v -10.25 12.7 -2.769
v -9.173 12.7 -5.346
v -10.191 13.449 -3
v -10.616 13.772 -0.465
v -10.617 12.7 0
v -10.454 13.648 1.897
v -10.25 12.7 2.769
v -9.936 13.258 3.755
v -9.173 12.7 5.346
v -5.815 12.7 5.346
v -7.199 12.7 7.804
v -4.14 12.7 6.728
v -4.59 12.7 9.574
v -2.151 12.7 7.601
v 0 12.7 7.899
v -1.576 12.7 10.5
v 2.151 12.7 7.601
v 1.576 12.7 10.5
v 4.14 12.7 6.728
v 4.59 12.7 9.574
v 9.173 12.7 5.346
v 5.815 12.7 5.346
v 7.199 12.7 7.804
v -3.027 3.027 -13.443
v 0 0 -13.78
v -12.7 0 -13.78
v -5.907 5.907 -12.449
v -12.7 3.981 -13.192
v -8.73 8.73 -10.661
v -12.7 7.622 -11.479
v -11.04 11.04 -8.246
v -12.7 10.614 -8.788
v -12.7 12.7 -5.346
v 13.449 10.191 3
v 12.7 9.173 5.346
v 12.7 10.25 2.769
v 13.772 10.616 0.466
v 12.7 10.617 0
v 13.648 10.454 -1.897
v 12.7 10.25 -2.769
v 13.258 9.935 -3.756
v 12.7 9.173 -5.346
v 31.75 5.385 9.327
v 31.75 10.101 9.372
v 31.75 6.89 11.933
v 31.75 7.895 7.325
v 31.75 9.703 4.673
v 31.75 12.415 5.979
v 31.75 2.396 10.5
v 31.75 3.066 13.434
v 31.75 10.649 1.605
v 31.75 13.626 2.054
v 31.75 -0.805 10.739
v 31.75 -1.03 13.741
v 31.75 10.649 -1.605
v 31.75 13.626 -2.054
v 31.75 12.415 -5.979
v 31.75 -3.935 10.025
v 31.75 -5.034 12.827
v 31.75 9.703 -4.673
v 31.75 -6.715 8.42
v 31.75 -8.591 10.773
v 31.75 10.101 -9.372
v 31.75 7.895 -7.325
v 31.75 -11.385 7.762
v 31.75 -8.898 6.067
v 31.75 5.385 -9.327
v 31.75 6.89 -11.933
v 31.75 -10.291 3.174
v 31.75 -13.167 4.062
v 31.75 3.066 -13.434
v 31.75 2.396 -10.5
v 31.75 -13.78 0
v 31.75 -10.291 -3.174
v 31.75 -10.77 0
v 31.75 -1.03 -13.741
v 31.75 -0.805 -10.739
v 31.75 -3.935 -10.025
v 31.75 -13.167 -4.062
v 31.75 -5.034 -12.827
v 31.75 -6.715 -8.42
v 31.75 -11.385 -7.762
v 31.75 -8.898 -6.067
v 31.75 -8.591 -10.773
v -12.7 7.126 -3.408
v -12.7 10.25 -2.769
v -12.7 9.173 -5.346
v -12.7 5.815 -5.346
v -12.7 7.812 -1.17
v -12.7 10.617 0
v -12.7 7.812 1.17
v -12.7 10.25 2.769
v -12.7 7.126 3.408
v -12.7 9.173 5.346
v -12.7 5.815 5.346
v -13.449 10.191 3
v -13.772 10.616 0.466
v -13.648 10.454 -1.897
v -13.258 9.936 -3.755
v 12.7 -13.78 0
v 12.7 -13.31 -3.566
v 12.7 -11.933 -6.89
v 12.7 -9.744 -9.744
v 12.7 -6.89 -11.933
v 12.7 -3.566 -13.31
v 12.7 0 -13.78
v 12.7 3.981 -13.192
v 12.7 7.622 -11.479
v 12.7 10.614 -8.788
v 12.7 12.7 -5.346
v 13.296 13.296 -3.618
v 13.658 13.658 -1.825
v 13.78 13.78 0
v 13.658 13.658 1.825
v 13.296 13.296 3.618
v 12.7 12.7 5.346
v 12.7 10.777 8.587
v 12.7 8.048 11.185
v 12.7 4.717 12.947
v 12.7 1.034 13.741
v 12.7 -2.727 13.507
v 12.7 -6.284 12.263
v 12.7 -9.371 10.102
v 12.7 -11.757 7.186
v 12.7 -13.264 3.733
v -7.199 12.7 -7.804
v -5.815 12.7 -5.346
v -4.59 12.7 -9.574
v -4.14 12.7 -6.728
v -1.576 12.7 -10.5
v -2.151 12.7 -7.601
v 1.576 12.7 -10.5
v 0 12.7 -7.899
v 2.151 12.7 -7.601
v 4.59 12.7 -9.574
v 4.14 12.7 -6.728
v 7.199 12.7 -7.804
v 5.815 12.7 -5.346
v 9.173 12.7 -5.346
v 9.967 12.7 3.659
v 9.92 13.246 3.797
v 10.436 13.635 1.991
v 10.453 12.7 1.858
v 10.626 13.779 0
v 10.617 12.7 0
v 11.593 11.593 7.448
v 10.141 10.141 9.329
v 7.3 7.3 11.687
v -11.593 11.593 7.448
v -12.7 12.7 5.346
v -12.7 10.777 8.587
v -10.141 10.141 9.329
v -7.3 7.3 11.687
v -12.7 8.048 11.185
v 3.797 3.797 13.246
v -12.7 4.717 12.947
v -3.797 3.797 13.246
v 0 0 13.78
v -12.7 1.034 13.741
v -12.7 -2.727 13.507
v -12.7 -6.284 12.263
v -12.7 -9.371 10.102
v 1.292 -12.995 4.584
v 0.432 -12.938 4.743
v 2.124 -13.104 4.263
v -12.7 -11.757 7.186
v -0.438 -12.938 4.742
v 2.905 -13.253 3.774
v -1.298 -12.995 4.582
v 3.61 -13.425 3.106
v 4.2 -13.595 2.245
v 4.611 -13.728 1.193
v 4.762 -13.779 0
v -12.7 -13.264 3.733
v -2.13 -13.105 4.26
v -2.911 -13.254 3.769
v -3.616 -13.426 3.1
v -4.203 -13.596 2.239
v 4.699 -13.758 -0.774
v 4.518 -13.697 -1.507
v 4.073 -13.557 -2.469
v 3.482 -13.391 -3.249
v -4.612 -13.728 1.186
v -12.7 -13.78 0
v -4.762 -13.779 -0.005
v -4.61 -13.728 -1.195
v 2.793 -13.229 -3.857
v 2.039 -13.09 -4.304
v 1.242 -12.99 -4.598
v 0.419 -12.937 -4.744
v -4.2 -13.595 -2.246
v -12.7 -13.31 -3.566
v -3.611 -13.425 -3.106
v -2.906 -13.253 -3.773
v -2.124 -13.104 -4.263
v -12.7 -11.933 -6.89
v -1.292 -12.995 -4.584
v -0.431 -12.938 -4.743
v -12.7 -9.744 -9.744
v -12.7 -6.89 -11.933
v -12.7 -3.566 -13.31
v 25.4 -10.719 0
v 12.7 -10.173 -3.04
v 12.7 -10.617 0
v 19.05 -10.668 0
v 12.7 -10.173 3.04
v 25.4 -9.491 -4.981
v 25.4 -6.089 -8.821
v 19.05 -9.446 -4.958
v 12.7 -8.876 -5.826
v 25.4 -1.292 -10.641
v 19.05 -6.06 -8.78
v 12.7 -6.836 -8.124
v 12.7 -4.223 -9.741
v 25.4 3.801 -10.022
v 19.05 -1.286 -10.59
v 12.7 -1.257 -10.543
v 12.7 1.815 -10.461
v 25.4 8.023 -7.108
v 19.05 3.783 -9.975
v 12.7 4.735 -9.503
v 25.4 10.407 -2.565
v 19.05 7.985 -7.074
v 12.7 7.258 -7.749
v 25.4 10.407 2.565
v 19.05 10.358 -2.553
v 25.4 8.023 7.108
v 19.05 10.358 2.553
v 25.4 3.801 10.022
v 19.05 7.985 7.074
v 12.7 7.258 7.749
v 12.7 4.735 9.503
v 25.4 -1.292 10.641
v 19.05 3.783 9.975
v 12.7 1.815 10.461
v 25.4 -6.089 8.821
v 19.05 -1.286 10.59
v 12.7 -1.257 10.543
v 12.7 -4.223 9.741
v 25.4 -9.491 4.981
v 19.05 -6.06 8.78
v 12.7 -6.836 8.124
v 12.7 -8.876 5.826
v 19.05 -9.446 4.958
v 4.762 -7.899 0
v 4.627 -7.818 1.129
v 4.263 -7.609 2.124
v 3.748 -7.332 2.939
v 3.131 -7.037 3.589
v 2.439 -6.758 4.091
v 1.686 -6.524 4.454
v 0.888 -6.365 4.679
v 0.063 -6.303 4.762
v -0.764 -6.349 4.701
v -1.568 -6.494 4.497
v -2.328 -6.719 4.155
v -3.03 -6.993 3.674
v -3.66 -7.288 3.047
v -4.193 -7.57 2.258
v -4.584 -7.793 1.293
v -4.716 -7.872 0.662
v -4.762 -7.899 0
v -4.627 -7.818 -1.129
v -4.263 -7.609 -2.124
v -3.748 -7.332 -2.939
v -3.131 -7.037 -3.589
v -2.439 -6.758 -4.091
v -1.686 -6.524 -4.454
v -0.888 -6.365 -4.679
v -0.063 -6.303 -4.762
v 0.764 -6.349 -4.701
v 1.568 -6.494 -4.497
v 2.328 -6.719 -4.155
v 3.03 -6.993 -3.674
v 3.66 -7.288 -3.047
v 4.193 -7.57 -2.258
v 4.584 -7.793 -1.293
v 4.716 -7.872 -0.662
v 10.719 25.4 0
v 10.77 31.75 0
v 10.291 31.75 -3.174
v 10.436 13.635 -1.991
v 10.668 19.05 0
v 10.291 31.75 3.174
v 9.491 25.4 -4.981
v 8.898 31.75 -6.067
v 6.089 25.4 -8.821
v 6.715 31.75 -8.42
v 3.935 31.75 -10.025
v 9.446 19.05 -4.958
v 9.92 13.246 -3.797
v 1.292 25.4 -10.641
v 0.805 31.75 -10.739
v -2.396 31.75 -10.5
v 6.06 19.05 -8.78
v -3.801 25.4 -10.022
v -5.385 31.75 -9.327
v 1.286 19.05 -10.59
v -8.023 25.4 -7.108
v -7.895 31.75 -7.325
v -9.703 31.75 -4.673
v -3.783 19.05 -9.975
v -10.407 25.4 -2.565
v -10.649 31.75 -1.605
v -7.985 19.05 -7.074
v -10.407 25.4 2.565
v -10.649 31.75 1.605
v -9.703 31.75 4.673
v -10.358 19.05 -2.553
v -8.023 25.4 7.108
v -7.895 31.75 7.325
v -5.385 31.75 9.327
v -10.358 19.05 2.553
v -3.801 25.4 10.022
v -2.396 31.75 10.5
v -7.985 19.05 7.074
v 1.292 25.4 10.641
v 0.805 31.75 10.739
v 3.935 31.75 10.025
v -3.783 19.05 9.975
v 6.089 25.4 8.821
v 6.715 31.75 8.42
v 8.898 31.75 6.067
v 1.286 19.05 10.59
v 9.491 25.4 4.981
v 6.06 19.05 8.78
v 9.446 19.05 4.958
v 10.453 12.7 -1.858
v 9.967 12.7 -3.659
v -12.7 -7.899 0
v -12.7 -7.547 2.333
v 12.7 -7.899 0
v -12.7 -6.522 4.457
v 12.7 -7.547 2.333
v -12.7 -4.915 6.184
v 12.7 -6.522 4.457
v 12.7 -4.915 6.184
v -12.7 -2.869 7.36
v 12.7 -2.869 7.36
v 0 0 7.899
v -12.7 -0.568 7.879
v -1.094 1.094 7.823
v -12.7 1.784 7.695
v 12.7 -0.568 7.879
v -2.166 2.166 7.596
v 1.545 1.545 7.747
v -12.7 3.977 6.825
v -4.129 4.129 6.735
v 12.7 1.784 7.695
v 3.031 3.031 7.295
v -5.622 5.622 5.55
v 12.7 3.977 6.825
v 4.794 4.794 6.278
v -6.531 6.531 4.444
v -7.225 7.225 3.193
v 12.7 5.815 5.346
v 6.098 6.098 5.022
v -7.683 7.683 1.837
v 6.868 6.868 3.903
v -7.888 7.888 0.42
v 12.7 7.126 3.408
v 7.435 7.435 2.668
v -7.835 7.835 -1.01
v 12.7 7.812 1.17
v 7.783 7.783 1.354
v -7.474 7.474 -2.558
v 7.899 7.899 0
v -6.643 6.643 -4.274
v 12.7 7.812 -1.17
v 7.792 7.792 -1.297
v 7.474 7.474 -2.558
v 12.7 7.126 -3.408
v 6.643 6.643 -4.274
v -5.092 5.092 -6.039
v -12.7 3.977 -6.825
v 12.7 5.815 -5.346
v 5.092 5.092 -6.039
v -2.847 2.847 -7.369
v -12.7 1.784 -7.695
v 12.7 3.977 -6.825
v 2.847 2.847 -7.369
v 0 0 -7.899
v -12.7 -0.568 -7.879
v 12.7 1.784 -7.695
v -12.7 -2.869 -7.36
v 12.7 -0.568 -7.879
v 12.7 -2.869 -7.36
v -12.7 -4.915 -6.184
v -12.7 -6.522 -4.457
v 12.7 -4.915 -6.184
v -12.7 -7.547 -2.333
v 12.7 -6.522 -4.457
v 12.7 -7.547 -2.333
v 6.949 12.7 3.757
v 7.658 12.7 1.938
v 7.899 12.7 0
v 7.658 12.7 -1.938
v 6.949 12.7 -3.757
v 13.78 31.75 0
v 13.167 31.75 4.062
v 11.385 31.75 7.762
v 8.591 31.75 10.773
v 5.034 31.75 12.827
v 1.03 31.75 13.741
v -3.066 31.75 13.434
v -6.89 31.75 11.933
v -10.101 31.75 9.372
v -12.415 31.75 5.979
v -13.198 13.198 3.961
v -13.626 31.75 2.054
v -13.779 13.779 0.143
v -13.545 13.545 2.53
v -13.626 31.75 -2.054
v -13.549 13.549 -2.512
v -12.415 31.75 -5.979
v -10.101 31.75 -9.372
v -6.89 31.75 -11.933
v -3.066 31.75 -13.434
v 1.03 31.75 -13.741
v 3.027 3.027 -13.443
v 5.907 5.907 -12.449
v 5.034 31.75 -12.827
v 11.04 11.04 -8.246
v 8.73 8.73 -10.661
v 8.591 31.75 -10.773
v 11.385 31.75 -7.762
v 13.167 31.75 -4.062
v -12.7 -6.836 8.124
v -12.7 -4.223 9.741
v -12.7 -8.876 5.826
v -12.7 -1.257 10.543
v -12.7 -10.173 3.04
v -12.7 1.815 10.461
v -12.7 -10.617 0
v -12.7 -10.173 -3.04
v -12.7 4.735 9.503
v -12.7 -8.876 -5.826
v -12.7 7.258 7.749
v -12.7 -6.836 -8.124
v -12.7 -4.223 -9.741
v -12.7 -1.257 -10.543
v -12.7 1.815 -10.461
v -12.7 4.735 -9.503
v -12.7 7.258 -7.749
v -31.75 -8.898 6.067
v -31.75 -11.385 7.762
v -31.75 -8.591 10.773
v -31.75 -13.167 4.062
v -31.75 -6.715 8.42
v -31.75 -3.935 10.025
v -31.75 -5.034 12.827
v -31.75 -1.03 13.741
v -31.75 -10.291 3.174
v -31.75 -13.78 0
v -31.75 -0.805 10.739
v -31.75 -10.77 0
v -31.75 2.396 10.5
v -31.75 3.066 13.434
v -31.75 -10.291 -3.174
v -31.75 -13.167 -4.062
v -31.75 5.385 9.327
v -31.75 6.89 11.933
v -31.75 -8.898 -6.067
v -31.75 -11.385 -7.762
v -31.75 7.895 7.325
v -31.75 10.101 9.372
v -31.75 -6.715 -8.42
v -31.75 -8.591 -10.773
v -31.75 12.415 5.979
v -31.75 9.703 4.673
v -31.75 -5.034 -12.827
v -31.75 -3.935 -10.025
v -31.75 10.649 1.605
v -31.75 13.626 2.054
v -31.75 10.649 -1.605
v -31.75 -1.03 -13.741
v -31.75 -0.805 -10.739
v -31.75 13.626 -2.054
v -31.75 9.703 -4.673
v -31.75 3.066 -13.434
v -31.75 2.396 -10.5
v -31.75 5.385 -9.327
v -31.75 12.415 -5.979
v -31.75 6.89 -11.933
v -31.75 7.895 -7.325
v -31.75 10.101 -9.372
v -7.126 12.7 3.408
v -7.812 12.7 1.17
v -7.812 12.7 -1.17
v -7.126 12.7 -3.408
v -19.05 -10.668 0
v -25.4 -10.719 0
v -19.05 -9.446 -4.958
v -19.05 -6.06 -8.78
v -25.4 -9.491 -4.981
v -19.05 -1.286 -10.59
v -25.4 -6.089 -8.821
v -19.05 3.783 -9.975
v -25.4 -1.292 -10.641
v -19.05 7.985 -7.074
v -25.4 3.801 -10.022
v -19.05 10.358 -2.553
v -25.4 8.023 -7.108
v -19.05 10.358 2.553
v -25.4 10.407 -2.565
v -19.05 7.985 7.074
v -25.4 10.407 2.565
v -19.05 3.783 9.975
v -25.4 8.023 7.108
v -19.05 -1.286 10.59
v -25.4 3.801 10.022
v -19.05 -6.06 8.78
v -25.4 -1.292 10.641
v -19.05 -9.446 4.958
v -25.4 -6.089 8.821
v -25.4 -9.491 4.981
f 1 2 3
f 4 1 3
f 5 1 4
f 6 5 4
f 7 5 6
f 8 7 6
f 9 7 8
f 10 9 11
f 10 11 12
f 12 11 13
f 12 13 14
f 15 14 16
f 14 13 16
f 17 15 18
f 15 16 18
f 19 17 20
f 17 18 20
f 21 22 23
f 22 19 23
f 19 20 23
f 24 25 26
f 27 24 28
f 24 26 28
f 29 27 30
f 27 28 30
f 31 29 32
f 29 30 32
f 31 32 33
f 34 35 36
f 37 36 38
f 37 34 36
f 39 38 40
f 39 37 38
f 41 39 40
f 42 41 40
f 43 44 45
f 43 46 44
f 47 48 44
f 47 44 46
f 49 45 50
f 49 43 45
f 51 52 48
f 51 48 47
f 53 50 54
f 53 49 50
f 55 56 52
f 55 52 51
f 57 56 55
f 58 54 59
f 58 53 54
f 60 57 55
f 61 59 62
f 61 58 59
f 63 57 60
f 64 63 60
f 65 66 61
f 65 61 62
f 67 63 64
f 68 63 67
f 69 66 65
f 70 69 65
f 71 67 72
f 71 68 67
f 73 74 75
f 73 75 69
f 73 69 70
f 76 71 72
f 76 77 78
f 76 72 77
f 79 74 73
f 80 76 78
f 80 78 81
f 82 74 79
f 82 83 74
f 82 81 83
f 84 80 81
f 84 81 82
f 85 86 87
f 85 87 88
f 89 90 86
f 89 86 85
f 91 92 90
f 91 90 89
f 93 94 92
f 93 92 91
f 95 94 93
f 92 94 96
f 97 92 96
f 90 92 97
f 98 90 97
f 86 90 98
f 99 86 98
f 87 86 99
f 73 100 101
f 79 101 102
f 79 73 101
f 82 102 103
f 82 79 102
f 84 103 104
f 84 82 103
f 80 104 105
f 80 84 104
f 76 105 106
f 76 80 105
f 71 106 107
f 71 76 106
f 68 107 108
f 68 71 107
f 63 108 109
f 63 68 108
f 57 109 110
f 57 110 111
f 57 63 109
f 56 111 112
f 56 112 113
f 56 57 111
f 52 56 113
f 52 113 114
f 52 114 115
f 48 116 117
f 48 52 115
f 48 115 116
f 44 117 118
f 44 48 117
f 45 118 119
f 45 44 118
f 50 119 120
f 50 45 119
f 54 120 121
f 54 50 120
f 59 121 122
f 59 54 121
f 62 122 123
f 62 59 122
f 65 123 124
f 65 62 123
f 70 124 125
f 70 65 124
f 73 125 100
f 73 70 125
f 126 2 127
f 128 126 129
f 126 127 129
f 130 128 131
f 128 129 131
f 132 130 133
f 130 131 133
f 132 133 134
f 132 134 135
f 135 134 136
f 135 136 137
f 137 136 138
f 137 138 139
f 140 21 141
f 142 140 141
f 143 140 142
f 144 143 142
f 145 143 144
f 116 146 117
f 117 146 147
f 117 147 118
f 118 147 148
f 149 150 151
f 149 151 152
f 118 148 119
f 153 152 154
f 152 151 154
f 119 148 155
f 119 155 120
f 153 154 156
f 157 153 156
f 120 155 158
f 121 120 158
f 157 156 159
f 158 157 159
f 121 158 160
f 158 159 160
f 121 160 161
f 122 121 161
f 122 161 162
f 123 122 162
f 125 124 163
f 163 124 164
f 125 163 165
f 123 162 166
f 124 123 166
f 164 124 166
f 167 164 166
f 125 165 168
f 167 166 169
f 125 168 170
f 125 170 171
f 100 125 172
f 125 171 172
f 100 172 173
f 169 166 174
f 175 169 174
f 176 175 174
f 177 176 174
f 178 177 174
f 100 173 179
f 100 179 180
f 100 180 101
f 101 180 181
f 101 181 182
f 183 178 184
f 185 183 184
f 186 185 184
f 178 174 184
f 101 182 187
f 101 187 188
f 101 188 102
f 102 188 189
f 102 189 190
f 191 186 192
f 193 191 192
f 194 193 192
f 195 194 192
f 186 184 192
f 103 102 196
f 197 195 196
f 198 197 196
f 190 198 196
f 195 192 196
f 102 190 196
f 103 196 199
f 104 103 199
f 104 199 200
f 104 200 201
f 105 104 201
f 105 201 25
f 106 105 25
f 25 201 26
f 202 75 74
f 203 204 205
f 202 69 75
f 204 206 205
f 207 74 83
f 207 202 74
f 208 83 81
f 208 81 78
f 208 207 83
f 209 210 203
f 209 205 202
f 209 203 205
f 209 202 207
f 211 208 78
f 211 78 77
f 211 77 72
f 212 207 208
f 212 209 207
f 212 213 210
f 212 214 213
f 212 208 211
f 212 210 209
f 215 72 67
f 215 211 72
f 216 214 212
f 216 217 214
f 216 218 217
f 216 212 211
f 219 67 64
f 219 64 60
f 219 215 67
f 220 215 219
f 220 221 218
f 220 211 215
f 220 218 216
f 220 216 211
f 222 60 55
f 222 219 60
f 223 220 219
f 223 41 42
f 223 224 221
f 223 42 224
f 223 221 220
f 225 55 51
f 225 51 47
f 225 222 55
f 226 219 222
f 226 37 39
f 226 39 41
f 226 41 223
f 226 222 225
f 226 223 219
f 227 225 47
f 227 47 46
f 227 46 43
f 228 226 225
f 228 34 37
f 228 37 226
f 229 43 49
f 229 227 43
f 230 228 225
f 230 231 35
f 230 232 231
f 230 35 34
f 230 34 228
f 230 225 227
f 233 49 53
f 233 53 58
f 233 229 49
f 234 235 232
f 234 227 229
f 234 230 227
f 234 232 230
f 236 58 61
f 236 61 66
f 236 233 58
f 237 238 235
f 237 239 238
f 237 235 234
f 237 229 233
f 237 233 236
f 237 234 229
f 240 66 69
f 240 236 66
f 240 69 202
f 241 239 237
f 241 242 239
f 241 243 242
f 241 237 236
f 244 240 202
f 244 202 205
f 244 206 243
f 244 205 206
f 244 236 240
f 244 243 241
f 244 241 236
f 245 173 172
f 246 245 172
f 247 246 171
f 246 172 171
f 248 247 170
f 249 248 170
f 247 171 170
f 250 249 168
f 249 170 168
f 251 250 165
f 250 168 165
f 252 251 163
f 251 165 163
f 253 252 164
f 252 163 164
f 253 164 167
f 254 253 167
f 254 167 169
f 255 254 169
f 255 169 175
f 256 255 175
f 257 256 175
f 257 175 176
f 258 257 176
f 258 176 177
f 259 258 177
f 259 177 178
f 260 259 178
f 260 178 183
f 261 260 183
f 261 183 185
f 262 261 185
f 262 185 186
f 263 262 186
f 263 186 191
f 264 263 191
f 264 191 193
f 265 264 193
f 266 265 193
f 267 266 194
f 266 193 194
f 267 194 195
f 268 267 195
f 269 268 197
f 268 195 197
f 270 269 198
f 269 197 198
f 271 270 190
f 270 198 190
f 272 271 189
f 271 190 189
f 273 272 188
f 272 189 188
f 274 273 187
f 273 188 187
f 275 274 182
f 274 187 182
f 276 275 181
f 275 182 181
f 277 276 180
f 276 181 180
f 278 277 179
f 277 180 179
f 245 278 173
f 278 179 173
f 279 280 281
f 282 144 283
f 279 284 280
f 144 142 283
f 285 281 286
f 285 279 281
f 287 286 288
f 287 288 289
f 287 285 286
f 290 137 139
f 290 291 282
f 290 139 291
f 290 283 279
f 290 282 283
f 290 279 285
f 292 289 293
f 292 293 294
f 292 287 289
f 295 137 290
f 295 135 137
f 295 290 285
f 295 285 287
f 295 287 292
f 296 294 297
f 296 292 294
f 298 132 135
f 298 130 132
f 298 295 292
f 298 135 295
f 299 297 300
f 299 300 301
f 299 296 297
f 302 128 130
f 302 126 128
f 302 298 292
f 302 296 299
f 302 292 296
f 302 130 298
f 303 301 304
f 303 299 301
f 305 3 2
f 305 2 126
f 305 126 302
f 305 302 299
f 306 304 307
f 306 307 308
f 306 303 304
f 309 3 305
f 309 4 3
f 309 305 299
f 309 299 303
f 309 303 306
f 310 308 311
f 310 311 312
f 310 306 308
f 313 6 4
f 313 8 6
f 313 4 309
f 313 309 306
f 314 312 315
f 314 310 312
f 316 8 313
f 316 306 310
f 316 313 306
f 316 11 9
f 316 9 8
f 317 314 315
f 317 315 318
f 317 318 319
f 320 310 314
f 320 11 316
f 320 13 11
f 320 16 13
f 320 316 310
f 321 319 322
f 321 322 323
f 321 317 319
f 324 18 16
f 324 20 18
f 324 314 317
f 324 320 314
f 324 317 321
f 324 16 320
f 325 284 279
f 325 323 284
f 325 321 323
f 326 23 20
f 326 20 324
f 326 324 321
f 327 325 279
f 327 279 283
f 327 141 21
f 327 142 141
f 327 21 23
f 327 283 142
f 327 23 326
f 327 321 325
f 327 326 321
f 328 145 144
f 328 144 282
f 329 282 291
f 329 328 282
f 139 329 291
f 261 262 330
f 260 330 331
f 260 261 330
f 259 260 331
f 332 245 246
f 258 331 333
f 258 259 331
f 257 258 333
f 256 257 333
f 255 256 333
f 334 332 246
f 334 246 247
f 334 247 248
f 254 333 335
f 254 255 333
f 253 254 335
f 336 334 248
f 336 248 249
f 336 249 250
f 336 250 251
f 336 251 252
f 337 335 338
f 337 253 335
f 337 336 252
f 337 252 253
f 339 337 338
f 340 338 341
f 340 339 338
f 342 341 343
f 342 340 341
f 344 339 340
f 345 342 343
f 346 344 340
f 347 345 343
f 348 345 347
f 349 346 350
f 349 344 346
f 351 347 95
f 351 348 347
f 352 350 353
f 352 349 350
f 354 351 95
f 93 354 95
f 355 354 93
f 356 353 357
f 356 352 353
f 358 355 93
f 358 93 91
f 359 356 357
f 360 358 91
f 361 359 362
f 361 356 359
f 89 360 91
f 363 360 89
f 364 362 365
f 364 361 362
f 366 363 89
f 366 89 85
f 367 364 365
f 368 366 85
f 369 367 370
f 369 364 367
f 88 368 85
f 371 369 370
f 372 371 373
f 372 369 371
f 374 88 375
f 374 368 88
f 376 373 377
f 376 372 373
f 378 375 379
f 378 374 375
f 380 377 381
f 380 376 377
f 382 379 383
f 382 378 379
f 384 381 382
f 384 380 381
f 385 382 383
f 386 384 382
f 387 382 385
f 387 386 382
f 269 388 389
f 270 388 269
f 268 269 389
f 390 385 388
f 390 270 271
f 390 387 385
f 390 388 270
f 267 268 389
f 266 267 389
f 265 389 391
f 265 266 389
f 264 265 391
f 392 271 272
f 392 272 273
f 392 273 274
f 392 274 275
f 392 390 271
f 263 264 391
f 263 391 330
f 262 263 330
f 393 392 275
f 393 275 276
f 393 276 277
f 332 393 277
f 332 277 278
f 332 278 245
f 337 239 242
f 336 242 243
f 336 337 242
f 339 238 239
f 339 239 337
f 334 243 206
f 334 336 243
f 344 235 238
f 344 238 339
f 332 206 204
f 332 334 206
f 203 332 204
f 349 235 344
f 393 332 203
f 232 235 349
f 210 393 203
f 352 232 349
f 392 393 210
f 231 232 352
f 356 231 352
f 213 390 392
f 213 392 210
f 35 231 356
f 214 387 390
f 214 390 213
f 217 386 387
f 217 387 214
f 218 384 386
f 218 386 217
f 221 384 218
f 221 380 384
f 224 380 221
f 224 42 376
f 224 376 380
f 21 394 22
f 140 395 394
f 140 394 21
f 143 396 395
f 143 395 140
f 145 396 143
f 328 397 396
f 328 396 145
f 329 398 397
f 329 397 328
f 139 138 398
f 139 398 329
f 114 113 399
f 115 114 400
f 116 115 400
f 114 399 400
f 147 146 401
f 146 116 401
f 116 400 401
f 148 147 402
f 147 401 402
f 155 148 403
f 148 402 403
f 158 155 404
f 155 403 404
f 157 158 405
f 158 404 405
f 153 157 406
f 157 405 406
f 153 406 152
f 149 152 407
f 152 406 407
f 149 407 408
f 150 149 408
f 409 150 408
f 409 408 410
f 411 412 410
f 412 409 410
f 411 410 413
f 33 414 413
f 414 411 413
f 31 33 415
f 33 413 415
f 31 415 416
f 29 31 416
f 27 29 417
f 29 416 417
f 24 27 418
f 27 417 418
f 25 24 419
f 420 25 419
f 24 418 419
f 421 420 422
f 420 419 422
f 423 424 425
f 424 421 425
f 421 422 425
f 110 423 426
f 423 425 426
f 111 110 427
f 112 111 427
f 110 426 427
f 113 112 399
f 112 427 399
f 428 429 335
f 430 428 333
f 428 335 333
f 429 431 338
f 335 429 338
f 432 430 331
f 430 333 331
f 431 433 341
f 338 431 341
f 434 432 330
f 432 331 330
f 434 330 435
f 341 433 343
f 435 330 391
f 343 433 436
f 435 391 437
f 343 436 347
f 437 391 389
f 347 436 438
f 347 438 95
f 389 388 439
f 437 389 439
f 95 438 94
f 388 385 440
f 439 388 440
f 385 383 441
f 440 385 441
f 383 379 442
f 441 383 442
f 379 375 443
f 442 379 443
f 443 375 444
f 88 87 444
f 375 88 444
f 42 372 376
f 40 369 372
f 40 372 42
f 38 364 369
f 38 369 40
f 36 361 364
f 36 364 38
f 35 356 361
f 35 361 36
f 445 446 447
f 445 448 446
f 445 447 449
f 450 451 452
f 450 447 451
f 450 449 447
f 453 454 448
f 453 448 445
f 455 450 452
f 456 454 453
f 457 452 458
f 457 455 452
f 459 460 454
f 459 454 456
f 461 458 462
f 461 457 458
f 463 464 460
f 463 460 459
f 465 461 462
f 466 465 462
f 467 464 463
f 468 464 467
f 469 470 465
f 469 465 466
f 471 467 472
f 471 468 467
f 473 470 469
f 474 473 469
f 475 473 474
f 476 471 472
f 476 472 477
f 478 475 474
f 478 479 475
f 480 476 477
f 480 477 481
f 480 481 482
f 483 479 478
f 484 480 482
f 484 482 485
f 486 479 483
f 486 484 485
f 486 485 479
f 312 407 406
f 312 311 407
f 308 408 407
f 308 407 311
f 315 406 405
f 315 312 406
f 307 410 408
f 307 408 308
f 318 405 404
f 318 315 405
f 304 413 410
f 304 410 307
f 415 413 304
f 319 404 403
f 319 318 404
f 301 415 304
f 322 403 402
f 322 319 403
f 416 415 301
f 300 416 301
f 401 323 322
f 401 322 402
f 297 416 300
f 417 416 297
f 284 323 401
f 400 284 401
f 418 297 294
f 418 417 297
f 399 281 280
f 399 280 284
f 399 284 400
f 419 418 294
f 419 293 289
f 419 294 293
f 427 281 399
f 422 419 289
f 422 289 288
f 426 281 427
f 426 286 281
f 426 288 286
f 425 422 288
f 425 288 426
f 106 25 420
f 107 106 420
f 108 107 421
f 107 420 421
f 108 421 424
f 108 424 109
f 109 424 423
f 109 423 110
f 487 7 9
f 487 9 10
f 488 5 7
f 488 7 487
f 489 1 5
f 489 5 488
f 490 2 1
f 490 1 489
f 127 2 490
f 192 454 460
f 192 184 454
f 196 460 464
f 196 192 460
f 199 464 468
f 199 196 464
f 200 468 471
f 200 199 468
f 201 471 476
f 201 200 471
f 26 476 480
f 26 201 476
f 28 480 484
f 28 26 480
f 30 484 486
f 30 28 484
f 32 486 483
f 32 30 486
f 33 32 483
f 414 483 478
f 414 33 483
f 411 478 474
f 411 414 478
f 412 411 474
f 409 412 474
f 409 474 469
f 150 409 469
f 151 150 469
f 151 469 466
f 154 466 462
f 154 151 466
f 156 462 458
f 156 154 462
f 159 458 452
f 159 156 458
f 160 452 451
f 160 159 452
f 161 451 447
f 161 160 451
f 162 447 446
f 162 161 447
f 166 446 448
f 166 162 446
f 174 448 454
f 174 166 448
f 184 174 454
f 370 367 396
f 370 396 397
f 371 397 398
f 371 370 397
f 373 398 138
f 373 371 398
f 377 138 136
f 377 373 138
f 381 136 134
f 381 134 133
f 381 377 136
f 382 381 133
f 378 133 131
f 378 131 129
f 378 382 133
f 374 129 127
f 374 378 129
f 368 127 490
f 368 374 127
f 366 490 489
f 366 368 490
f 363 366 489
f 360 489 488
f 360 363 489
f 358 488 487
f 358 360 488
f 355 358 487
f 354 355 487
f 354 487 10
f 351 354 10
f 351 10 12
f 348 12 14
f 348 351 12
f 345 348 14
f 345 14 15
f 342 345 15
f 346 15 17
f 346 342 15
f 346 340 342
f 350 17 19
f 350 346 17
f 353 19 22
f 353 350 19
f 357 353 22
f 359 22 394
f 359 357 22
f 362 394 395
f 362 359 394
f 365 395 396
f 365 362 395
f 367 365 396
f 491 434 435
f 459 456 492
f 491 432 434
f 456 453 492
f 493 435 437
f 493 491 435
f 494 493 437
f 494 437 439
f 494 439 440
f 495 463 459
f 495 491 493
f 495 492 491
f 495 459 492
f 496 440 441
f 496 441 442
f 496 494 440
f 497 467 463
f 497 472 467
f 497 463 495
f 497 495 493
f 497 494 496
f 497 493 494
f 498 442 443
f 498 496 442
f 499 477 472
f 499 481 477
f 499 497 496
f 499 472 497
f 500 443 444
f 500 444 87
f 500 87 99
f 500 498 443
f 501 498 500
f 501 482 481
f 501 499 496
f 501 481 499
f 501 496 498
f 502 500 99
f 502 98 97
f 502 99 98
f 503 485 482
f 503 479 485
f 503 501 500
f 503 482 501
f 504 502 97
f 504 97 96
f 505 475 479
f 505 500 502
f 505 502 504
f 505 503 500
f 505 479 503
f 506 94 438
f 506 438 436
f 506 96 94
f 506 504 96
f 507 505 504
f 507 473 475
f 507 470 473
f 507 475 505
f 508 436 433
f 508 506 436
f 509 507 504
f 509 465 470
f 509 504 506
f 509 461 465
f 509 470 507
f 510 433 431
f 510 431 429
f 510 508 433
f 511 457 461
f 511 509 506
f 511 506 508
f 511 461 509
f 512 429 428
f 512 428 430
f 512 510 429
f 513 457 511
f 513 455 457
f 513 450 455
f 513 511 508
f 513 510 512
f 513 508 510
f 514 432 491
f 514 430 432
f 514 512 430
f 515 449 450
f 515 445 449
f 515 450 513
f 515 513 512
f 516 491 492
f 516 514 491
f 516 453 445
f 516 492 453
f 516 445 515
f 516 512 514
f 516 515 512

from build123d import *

# Parameters (mm, degrees)
SKETCH4_R                    = 13.7795
BOSS_EXTRUDE1_DEPTH          = 25.4
SKETCH5_R                    = 13.7795
BOSS_EXTRUDE2_DEPTH          = 12.7
F_3_8_0_375_DIAMETER_HOLE1_D = 9.525


with BuildPart() as part:
    # Sketch1 → Revolve1 (revolve)
    with BuildSketch(Plane.XY):
        Polygon((-31.75, -13.7795), (-12.7, -13.7795), (-12.7, -10.6172), (-31.75, -10.7696), align=None)
        Polygon((31.75, -10.7696), (12.7, -10.6172), (12.7, -13.7795), (31.75, -13.7795), align=None)
    revolve(axis=Axis((-31.75, 0, 0), (1, 0, 0)))



with BuildPart() as body_2:
    # Sketch2 → Revolve2 (revolve)
    with BuildSketch(Plane.XY):
        Polygon((10.7696, 31.75), (10.6172, 12.7), (13.7795, 12.7), (13.7795, 31.75), align=None)
    revolve(axis=Axis((0, 0, 0), (0, 1, 0)))


with BuildPart() as part_1:
    add(part.part)

    add(body_2.part)  # Boss-Extrude1 merges body 2
    # Sketch4 → Boss-Extrude1 (add)
    with BuildSketch(Plane(origin=(-12.7, 0, 0), x_dir=(0, 0, -1), z_dir=(1, 0, 0))):
        Circle(SKETCH4_R)
    extrude(amount=BOSS_EXTRUDE1_DEPTH)

    # Sketch5 → Boss-Extrude2 (add)
    with BuildSketch(Plane.XZ.offset(-12.7)):
        Circle(SKETCH5_R)
    extrude(amount=BOSS_EXTRUDE2_DEPTH)

    # Sketch6 → Cut-Revolve1 (revolve, cut)
    with BuildSketch(Plane.XY):
        Polygon((-31.75, -10.7696), (-12.7, -10.6172), (-12.7, -7.8994), (12.7, -7.8994), (12.7, -10.6172), (31.75, -10.7696), (31.75, 0), (-31.75, 0), align=None)
    revolve(axis=Axis((31.75, 0, 0), (-1, 0, 0)), mode=Mode.SUBTRACT)

    # Sketch7 → Cut-Revolve2 (revolve, cut)
    with BuildSketch(Plane.XY):
        Polygon((10.7696, 31.75), (10.6172, 12.7), (7.8994, 12.7), (7.8994, 0), (0, 0), (0, 31.75), align=None)
    revolve(axis=Axis((0, 0, 0), (0, 1, 0)), mode=Mode.SUBTRACT)

    # 3/8 (0.375) Diameter Hole1 (through all)
    with Locations(Plane(origin=(0, 31.75, 0), x_dir=(-1, 0, 0), z_dir=(0, 1, 0))):
        with Locations((0, 0)):
            Hole(F_3_8_0_375_DIAMETER_HOLE1_D / 2)


solid = part_1.part
